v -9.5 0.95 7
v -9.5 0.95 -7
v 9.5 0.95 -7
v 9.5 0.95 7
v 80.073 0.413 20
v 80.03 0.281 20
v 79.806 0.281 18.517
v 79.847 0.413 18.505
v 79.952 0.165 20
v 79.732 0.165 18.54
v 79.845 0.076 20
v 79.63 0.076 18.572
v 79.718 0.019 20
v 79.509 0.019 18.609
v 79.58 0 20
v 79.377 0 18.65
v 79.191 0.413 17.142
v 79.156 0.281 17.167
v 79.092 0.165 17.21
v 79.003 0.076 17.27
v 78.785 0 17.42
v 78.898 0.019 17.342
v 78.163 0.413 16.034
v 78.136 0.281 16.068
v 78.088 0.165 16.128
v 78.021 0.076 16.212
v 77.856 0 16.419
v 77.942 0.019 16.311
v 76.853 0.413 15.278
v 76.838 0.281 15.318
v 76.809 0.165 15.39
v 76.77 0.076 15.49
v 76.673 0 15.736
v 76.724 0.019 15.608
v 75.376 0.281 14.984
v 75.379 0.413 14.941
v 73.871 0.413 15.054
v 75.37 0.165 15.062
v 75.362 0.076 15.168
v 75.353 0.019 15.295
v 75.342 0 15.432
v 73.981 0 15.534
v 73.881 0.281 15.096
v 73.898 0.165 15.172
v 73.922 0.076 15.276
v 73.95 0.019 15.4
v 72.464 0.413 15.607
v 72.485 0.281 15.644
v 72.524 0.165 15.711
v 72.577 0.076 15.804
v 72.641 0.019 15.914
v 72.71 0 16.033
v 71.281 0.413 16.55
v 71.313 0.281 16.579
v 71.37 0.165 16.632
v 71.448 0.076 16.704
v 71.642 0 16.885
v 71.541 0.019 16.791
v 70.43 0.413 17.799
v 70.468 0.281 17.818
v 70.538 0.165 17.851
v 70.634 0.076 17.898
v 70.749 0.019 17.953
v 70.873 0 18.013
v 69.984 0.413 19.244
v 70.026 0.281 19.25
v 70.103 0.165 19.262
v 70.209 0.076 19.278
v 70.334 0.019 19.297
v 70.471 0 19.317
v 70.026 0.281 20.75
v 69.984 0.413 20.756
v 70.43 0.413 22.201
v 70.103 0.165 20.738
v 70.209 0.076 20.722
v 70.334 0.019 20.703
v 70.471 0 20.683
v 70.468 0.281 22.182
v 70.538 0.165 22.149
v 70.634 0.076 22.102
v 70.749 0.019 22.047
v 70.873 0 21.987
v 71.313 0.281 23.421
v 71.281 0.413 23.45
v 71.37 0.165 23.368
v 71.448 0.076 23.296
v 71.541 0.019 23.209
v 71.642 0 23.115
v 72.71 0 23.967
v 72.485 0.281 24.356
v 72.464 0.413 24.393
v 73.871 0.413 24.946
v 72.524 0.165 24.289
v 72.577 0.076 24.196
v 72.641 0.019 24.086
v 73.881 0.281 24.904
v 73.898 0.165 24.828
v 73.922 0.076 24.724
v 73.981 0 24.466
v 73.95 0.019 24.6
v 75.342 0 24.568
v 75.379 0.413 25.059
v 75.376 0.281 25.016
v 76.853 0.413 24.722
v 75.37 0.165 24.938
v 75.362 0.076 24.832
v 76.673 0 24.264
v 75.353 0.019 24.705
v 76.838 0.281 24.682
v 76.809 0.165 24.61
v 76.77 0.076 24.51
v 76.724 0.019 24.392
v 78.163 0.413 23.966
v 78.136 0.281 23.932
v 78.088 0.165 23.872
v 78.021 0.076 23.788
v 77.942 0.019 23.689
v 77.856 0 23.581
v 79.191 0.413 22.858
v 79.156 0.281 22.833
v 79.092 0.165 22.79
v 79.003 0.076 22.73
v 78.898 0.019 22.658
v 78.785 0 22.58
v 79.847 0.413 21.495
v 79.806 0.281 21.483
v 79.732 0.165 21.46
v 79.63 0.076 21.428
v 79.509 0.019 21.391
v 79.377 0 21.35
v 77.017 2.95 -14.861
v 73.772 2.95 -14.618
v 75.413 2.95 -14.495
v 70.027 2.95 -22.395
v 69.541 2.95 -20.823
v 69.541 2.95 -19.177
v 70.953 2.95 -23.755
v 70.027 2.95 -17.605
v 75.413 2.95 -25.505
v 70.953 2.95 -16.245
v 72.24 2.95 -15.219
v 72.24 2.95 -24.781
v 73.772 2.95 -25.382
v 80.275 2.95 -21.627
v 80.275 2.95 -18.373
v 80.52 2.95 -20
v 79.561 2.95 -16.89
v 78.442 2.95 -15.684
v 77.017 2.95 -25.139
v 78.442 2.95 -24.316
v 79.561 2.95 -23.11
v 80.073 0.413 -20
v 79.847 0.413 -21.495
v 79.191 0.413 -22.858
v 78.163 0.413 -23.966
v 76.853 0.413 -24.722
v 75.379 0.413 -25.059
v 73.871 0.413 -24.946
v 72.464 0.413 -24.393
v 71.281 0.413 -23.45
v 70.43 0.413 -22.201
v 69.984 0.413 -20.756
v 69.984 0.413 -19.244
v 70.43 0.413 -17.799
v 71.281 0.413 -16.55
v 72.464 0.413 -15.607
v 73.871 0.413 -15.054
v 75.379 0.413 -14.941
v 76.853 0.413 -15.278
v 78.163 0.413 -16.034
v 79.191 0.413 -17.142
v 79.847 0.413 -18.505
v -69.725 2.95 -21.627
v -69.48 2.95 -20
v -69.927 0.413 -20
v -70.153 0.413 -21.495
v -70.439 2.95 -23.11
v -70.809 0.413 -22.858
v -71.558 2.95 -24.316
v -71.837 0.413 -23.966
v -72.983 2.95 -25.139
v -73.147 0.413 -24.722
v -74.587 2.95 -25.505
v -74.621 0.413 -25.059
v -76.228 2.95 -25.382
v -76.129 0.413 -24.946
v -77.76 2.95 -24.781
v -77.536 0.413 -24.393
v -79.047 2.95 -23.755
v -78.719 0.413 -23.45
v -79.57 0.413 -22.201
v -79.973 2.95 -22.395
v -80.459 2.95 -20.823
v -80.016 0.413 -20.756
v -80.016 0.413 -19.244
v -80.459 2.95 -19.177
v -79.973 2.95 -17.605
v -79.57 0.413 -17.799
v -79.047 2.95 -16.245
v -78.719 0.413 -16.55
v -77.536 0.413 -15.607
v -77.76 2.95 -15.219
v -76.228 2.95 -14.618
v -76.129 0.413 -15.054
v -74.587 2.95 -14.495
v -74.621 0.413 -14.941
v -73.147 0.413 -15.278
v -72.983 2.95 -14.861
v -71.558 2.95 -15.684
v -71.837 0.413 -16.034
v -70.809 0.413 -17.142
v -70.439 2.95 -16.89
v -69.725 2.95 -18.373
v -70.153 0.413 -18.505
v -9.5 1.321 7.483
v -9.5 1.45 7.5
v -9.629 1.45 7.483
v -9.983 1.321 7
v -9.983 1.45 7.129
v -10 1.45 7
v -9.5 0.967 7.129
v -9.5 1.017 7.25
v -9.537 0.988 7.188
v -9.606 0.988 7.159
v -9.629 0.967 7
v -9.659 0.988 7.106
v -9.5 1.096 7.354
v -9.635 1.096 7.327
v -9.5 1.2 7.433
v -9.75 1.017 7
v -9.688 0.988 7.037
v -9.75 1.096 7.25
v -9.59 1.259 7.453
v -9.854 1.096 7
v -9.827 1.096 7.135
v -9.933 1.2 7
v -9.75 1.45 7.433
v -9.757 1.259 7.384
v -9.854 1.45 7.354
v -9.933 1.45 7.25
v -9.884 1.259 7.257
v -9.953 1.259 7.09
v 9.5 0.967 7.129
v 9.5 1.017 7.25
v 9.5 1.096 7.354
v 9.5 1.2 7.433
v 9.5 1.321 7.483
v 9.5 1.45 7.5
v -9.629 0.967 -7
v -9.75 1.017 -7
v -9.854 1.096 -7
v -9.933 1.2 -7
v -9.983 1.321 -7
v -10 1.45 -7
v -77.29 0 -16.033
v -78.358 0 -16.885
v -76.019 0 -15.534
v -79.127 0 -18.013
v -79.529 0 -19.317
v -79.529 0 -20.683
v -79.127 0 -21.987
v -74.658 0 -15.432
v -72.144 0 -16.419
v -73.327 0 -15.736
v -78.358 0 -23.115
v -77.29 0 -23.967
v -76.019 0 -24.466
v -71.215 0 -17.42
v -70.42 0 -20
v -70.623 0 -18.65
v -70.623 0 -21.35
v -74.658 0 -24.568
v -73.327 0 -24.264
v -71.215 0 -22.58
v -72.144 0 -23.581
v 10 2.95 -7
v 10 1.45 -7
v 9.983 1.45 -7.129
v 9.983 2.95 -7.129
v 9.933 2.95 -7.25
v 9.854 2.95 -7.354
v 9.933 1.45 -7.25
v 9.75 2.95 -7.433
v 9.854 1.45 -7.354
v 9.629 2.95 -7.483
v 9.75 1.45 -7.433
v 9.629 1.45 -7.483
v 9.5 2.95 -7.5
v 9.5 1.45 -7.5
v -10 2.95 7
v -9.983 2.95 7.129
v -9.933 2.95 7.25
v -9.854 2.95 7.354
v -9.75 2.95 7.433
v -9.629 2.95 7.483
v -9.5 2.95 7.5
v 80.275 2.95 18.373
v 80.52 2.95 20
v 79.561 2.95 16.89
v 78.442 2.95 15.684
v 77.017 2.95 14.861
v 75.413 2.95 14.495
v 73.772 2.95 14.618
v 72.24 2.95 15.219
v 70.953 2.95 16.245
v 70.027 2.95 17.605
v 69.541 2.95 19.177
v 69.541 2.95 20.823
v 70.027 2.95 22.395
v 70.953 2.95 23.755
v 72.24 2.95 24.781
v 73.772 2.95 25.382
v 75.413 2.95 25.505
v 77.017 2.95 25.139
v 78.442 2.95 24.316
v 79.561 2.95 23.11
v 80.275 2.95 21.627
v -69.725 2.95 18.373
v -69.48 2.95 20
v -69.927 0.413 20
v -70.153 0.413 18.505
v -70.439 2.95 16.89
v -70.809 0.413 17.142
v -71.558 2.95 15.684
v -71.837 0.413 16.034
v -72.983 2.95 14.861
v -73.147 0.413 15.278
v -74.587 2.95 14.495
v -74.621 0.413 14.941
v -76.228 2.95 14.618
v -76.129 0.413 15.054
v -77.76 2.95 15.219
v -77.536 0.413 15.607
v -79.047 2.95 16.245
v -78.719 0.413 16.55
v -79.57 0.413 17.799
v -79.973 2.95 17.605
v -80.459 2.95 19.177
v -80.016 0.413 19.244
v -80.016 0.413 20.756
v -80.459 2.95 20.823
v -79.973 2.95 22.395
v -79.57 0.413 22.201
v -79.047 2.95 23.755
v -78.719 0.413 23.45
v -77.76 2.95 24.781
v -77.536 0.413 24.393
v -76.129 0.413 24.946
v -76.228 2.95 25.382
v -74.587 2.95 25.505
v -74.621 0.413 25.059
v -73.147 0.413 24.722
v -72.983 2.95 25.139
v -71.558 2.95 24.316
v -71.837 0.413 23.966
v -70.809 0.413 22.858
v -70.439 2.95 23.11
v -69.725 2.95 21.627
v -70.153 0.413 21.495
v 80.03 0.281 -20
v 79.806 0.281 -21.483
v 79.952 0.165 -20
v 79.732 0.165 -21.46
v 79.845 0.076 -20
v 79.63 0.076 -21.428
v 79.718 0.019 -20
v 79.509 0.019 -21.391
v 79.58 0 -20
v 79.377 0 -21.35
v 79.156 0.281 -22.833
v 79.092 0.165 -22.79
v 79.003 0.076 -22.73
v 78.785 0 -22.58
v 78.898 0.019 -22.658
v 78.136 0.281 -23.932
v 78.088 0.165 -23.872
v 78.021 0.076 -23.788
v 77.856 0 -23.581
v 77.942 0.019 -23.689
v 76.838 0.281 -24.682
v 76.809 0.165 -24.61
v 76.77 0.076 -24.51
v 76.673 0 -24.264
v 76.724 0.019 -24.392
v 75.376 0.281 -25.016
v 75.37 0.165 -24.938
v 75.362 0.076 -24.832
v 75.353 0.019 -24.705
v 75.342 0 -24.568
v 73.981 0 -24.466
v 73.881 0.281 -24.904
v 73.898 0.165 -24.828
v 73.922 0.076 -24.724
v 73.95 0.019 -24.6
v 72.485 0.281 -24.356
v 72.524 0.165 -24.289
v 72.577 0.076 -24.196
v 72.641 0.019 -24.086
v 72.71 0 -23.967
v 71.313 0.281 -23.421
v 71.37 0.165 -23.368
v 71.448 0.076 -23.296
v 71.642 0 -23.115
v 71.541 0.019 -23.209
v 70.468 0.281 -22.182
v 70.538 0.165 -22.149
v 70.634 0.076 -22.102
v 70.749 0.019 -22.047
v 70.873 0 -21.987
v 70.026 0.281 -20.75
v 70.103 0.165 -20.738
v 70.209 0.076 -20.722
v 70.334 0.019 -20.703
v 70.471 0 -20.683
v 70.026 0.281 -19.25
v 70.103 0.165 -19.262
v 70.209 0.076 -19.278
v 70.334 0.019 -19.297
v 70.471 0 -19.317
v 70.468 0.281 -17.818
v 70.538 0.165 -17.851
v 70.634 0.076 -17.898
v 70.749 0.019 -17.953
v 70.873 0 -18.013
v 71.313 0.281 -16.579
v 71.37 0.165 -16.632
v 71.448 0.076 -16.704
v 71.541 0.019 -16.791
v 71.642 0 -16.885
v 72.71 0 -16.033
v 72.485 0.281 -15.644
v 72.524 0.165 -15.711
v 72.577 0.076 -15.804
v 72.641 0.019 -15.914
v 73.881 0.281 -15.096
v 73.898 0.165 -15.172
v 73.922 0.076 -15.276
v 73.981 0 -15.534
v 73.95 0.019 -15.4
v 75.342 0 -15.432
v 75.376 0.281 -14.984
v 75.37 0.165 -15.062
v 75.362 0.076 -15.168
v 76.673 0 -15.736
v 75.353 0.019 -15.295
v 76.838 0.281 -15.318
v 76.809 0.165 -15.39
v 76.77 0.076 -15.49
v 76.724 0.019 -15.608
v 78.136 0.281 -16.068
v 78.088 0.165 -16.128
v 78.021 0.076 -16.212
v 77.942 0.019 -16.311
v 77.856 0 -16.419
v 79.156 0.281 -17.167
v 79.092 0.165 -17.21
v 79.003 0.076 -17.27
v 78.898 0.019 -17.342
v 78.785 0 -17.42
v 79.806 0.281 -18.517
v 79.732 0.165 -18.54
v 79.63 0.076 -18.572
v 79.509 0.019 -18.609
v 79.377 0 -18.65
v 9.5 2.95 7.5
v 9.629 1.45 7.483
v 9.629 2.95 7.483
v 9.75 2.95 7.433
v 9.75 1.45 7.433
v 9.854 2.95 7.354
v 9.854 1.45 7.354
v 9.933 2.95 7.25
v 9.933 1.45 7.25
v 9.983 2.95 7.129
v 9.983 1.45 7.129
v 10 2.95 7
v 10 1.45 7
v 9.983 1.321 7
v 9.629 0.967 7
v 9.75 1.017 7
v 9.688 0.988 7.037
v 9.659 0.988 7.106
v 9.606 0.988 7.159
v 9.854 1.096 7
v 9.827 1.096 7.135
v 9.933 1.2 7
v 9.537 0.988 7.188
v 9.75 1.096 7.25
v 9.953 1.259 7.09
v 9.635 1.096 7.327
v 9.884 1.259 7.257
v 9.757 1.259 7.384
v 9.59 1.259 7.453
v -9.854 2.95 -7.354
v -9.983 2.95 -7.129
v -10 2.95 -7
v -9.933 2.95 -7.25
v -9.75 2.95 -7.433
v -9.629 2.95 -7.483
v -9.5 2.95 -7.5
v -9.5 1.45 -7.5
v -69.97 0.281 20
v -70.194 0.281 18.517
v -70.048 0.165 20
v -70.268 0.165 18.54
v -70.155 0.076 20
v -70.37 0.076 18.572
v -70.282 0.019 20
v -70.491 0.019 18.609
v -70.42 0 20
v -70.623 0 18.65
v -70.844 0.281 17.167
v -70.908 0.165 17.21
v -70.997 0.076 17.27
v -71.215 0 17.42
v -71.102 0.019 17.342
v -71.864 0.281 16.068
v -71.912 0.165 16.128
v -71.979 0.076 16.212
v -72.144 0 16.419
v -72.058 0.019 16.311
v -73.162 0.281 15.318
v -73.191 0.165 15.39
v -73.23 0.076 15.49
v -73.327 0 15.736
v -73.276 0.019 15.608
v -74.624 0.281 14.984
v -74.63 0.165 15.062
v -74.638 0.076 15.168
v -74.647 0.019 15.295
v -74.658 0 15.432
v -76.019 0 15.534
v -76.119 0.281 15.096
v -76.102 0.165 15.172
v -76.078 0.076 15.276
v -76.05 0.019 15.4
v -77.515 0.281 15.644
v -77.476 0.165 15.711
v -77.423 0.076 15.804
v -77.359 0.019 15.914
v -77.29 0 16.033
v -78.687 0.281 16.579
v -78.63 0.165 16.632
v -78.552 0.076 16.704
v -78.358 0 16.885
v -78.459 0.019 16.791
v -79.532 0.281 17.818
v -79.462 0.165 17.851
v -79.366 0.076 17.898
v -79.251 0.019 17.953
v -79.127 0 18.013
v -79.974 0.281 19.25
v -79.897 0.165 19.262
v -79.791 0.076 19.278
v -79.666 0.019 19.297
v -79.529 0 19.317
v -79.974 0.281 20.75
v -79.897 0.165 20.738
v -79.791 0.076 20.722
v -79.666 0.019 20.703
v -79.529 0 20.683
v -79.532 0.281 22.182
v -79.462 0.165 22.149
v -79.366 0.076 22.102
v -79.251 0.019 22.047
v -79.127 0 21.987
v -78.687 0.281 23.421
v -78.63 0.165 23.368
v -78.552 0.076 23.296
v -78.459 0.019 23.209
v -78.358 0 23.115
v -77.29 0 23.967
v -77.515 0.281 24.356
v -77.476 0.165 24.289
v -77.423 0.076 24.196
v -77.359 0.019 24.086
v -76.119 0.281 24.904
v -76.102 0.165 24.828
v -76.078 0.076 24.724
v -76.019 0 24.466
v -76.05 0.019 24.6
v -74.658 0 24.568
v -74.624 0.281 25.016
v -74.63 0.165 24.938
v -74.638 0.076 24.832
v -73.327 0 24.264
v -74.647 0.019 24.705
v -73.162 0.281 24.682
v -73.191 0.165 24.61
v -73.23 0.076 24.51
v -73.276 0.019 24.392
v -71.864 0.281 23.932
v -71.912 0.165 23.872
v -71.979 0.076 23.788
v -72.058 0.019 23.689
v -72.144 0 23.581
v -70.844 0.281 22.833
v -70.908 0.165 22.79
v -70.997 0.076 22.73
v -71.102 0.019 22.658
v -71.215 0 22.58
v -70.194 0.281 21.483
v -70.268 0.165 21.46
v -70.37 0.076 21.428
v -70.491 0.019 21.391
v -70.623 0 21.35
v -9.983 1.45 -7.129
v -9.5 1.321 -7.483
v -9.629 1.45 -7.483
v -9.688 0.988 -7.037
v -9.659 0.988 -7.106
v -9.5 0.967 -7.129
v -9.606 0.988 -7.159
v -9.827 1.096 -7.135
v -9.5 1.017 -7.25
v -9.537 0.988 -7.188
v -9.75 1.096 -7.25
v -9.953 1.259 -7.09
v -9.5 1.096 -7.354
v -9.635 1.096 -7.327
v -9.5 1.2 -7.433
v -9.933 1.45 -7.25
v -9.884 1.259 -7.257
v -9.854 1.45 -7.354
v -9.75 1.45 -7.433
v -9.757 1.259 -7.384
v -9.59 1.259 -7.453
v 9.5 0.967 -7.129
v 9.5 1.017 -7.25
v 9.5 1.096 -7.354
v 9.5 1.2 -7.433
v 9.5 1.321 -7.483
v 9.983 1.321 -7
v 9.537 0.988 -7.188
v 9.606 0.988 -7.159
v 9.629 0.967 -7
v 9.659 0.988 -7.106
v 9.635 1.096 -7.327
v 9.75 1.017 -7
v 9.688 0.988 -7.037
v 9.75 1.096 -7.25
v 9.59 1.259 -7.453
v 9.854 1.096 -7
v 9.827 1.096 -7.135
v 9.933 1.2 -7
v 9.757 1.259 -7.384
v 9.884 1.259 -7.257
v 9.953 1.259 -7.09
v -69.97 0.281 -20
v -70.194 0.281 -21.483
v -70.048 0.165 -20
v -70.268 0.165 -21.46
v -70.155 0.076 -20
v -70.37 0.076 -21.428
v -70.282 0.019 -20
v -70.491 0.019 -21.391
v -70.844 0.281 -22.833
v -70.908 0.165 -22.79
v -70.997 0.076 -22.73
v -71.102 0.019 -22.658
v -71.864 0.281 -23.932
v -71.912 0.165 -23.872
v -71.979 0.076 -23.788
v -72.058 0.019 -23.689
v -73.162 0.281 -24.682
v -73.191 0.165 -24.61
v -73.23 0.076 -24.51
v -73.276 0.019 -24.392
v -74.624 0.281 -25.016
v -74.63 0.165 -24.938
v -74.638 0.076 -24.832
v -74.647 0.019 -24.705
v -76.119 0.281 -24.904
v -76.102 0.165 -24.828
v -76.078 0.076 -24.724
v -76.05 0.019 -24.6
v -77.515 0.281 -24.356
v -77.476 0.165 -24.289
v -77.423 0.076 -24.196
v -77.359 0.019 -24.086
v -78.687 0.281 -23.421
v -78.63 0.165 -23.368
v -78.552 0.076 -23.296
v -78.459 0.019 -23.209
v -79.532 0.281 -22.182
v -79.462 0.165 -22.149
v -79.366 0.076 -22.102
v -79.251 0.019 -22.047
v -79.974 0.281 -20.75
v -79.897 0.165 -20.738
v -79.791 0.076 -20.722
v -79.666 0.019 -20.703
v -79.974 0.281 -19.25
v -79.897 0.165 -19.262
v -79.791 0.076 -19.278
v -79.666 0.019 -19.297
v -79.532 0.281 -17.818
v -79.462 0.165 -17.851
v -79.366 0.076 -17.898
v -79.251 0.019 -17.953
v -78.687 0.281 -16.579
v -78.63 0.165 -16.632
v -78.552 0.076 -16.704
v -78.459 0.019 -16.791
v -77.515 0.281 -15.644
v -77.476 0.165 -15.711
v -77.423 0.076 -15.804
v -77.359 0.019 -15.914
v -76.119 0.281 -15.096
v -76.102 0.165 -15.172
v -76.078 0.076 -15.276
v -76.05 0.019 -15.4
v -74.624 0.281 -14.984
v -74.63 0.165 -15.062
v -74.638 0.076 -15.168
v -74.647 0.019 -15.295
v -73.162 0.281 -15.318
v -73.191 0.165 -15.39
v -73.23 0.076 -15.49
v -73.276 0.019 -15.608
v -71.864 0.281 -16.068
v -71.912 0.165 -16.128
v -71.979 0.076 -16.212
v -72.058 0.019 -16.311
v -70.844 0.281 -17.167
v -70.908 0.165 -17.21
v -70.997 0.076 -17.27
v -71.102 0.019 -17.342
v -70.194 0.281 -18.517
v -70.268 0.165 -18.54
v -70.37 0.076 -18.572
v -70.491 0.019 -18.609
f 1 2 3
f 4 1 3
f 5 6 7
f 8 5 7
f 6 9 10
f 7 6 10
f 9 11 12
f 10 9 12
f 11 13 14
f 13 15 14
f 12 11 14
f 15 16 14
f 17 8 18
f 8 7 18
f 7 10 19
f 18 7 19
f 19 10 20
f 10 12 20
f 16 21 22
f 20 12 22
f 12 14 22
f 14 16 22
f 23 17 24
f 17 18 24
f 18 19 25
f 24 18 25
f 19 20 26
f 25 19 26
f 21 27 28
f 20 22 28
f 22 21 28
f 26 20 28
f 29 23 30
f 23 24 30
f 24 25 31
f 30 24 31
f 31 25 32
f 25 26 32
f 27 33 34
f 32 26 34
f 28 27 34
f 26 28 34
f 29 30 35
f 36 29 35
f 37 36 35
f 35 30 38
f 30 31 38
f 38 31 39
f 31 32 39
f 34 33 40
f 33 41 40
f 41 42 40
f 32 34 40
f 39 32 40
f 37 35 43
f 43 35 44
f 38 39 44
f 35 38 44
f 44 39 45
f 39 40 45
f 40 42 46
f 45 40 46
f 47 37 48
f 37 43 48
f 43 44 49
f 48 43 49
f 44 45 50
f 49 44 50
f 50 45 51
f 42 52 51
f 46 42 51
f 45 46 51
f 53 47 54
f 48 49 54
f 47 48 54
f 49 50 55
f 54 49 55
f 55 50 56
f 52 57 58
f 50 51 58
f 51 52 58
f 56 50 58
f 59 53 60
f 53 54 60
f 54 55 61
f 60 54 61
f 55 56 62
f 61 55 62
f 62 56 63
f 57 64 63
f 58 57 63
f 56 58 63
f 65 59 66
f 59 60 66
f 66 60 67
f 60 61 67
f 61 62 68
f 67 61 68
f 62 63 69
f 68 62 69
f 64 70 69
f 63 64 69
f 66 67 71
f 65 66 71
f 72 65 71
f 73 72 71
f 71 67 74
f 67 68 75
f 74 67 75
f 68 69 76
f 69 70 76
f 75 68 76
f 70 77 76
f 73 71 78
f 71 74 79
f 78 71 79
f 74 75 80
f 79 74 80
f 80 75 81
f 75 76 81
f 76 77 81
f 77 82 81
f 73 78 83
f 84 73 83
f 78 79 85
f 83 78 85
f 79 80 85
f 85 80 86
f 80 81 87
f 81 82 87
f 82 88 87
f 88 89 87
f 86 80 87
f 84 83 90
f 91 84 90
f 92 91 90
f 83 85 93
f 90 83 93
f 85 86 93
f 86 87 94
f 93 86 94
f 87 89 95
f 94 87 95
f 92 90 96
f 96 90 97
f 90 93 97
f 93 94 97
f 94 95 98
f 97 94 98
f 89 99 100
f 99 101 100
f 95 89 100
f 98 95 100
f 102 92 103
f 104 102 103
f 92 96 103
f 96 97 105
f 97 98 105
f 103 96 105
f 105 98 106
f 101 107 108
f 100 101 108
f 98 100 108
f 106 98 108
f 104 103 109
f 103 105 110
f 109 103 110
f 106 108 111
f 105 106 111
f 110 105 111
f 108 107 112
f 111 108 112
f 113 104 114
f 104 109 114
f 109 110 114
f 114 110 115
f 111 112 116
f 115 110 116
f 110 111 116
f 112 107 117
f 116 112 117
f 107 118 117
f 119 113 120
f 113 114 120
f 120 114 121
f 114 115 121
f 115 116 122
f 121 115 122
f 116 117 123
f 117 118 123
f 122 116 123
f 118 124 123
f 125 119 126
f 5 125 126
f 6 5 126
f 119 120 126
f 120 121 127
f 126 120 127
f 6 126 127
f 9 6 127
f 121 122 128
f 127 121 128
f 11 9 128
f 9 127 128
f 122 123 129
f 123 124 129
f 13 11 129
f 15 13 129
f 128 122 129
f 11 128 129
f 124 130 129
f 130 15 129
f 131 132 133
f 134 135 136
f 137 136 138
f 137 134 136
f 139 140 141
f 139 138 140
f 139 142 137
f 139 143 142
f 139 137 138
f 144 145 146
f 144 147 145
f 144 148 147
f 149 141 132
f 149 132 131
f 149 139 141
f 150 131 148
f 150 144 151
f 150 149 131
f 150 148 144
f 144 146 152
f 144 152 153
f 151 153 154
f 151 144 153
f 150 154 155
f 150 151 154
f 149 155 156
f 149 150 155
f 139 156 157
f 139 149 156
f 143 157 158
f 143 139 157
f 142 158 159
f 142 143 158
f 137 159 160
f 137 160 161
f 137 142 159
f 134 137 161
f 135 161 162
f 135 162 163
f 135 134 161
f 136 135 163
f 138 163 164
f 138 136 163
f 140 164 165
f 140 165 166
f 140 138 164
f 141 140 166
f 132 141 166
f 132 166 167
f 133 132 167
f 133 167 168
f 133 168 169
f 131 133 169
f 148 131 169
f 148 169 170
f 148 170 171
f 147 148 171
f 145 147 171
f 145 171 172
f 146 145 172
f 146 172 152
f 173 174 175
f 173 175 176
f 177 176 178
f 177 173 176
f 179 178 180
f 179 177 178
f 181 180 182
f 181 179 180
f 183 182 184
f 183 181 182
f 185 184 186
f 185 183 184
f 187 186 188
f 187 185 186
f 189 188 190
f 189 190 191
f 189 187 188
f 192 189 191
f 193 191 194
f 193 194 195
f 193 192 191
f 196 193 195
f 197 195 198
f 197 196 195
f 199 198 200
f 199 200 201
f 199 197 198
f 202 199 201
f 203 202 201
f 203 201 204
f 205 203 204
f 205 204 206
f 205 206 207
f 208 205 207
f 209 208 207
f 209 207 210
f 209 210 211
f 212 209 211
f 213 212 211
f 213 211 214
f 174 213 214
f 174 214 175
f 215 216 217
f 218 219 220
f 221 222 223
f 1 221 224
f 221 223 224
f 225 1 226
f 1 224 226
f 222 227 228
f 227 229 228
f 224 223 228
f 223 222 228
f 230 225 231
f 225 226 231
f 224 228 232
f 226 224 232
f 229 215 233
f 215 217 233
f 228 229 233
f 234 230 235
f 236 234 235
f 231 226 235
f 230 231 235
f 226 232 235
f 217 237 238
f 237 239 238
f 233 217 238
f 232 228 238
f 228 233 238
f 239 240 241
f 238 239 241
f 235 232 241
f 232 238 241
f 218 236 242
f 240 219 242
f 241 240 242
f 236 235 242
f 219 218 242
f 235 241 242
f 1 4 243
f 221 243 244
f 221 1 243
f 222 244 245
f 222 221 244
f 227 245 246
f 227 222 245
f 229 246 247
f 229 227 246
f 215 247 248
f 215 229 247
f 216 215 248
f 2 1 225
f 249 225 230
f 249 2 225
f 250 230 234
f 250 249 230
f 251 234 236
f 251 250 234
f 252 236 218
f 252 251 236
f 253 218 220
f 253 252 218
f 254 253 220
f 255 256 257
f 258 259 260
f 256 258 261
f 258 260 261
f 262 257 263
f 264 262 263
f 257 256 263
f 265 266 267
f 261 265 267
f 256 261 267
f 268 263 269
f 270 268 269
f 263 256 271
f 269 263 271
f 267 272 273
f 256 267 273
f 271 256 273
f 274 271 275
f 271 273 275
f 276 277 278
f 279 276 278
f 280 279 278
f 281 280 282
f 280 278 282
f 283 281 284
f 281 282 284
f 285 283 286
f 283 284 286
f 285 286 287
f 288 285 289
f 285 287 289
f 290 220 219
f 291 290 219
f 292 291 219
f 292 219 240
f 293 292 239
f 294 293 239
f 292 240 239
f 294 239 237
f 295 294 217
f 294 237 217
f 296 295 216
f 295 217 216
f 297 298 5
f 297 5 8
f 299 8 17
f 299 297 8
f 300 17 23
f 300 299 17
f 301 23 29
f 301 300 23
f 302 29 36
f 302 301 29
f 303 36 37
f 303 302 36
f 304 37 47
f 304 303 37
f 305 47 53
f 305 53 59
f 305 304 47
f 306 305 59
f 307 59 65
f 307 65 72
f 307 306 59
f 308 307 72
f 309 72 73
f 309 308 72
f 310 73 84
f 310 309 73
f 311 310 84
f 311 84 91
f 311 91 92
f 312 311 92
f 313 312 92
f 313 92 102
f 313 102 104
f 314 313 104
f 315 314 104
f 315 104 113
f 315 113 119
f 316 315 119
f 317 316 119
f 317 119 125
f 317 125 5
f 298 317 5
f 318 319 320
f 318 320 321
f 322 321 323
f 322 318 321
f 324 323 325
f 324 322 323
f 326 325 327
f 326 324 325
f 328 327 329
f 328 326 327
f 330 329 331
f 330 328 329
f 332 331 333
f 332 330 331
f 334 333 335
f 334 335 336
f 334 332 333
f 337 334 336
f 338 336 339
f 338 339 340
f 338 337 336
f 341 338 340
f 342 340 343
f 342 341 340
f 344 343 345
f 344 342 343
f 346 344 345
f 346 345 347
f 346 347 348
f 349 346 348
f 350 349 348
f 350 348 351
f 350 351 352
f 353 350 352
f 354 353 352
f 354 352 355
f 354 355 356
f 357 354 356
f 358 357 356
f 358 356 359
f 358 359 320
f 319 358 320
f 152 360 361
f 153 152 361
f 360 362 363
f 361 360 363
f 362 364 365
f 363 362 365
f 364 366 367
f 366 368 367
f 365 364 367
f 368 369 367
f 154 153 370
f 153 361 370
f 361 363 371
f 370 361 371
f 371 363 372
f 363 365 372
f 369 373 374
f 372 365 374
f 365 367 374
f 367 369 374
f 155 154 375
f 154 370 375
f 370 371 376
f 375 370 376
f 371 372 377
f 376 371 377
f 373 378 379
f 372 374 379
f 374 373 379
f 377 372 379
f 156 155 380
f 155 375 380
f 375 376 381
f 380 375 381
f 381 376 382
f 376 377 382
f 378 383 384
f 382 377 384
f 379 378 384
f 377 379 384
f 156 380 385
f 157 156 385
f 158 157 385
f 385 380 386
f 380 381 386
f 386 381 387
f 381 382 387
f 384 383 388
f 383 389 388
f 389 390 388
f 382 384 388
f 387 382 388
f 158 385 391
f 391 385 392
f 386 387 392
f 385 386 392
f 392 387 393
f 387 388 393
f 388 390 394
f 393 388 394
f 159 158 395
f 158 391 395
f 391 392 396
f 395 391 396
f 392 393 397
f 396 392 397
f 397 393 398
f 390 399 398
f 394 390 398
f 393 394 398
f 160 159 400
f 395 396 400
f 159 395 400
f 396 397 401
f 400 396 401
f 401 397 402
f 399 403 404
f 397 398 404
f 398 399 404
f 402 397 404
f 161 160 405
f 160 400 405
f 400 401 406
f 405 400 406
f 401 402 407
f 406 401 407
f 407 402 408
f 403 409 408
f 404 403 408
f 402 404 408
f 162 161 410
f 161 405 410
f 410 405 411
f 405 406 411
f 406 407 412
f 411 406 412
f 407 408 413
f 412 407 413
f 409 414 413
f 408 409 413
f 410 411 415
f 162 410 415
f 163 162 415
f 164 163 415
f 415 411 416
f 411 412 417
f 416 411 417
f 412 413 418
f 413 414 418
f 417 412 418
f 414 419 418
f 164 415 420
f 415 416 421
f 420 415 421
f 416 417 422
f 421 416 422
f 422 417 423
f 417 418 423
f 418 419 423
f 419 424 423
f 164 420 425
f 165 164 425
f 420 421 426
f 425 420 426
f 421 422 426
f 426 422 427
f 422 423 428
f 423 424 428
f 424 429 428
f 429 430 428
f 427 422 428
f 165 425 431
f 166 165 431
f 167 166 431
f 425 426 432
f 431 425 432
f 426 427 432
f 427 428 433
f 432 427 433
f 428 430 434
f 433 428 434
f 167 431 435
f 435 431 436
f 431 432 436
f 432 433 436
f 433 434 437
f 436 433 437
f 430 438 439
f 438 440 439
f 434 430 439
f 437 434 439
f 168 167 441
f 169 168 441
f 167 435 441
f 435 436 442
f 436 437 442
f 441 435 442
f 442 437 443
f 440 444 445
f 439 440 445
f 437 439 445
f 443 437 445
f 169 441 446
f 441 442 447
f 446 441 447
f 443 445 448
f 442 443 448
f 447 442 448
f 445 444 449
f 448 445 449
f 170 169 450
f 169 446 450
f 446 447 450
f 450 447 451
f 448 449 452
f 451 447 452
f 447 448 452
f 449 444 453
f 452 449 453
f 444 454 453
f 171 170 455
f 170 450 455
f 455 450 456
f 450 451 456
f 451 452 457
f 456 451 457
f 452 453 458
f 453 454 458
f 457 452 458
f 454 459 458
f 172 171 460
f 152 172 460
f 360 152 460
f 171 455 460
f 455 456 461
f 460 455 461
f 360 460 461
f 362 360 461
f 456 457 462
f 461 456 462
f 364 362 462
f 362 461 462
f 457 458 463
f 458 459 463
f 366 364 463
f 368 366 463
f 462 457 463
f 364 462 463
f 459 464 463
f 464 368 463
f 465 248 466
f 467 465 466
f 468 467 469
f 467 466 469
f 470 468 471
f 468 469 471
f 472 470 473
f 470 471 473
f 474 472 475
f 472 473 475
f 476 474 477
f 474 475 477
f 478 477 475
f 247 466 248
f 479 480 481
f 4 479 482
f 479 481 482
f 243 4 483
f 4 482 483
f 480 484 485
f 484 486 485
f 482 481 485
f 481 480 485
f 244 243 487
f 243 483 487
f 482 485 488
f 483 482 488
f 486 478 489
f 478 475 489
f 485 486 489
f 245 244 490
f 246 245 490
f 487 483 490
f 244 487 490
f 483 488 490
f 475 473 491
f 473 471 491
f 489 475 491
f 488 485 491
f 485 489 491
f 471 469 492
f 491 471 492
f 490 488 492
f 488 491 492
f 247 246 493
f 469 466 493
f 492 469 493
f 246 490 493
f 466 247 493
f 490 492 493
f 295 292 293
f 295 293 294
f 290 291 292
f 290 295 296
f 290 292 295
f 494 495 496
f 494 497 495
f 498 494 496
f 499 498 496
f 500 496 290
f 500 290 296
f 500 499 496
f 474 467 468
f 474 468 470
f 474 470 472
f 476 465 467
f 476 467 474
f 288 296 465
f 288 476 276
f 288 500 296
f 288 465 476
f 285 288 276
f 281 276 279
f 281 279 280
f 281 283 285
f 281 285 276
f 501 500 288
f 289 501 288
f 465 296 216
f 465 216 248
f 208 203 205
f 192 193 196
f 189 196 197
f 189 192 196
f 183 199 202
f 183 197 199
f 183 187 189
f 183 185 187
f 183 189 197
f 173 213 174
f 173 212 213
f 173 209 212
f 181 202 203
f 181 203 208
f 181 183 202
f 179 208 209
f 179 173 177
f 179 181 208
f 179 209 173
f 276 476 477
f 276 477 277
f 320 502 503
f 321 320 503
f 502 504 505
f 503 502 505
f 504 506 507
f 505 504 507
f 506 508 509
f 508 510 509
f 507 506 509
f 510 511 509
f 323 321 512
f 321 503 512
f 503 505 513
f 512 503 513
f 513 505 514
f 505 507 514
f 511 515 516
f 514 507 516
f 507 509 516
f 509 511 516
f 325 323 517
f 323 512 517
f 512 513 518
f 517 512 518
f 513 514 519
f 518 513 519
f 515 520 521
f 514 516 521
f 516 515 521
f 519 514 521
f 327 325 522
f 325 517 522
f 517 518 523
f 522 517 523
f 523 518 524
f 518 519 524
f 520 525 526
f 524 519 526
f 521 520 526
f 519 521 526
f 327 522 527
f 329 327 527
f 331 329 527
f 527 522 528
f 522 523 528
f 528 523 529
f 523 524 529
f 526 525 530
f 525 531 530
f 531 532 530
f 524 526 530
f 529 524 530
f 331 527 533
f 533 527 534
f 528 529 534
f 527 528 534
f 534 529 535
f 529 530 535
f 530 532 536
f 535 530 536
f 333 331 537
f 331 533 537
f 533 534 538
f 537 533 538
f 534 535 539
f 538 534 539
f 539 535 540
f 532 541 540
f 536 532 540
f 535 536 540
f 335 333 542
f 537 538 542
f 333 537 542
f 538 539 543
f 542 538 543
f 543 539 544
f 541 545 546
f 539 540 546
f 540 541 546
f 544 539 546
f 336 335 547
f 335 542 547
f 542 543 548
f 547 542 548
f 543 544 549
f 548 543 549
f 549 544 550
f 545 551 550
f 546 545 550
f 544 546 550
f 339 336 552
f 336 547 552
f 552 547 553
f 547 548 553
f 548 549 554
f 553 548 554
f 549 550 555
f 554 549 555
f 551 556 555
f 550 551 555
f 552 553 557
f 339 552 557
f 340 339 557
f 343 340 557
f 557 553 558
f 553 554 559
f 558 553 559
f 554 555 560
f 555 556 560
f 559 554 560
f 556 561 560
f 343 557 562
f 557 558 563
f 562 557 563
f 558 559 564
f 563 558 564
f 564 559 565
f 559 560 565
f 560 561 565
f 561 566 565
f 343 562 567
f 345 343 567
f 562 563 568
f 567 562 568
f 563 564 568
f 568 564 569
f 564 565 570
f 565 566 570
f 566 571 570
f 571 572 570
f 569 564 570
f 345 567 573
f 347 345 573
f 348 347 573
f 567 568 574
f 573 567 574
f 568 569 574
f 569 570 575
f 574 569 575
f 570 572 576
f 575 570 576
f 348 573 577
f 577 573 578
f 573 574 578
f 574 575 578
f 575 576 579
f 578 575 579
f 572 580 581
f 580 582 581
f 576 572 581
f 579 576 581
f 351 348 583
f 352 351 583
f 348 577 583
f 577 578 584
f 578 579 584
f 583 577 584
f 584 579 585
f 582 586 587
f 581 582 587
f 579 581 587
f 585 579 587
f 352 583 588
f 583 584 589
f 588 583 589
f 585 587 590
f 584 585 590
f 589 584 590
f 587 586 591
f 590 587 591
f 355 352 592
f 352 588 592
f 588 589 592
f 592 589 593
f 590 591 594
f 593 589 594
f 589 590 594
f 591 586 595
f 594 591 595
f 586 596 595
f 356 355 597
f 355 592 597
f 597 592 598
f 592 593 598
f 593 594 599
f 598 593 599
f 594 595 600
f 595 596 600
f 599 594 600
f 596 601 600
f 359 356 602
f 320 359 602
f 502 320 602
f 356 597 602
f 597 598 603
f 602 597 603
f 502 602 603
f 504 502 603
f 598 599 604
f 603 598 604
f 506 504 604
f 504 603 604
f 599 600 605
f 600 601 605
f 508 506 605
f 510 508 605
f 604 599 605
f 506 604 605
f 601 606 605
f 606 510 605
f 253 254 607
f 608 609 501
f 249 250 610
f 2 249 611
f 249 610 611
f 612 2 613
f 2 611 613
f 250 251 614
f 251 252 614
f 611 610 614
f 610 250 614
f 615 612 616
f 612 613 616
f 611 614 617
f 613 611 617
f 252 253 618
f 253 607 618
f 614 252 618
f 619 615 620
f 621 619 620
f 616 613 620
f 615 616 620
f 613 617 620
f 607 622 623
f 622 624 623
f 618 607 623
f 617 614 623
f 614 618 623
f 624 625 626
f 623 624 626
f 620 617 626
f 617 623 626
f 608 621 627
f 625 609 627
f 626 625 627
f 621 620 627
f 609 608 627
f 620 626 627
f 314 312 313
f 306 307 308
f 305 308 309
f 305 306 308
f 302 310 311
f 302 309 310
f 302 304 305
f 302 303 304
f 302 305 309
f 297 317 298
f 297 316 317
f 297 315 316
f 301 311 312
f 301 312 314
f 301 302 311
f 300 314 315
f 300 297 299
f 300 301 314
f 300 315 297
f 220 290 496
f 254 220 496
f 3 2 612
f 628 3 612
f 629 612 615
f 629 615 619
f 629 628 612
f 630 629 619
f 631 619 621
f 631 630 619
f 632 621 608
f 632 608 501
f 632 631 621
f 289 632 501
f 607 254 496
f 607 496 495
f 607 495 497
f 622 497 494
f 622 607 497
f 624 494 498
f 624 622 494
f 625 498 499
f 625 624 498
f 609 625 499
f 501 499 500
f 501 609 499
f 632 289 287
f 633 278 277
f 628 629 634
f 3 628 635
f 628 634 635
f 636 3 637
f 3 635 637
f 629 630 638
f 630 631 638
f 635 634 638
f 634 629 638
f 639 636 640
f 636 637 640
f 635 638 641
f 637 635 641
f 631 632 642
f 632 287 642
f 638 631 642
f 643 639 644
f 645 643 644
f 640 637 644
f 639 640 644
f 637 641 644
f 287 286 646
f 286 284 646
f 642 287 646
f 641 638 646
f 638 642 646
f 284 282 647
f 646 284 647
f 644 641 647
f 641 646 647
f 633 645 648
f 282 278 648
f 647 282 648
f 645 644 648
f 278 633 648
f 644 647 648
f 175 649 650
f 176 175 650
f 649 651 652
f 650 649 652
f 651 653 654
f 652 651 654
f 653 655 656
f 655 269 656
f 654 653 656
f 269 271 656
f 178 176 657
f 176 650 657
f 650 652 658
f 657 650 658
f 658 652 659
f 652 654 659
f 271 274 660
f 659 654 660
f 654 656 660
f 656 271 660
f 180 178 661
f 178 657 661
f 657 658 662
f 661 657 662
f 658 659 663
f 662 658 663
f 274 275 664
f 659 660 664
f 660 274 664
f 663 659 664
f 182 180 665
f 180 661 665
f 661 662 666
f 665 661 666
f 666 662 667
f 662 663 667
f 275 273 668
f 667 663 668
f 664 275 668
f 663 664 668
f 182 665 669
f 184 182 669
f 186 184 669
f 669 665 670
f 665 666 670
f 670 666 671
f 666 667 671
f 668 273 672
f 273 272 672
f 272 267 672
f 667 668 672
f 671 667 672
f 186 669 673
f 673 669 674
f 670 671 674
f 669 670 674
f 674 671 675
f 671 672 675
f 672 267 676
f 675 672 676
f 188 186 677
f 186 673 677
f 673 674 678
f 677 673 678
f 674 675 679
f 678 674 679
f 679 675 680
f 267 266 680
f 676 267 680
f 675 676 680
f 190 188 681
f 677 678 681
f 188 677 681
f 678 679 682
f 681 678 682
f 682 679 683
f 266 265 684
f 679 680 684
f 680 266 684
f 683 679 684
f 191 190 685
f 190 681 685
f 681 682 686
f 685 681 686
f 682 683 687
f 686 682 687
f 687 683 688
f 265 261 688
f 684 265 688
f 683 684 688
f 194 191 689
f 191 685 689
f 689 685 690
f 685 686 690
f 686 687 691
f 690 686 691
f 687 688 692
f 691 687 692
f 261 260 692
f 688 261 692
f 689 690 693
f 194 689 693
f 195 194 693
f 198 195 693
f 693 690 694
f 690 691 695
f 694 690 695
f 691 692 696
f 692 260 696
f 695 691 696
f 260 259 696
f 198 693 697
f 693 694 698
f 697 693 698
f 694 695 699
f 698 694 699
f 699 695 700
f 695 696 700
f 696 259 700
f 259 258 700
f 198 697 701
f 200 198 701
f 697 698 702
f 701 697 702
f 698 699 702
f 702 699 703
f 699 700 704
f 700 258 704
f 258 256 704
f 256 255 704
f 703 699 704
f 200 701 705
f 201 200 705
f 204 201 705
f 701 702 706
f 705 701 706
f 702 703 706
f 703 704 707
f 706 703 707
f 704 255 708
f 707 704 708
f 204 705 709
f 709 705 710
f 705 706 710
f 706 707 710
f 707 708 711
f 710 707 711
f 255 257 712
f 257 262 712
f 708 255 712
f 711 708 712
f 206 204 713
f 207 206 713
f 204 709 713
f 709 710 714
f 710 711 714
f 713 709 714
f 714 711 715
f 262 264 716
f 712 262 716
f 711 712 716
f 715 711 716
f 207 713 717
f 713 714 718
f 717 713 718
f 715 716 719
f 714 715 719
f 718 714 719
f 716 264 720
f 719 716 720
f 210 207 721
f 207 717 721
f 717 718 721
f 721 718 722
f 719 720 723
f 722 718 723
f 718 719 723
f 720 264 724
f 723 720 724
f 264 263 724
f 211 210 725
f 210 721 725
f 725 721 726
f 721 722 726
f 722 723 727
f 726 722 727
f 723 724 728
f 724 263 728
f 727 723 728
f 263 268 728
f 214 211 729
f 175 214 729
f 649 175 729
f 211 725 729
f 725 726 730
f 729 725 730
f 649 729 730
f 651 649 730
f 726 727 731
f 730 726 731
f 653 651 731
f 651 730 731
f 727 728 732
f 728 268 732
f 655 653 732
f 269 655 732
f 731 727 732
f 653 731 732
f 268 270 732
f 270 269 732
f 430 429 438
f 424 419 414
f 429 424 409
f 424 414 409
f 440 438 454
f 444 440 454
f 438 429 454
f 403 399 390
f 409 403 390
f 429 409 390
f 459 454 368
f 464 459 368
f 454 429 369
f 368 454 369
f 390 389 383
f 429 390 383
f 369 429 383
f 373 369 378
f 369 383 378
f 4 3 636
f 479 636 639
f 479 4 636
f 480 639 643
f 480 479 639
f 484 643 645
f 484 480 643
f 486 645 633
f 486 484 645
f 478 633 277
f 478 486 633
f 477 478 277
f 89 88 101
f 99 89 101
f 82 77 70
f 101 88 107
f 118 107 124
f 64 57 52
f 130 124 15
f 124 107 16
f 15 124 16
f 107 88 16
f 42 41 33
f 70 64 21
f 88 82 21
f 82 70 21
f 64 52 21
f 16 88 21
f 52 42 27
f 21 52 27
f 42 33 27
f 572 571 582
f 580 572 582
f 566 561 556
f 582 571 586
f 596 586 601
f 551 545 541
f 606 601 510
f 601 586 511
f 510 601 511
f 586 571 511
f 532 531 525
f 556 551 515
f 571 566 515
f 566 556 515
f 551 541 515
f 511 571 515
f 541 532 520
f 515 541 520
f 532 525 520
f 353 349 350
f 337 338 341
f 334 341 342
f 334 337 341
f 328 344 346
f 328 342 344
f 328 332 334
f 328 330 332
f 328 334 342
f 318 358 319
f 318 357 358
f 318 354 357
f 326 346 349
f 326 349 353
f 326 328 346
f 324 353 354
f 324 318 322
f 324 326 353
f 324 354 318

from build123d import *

# Parameters (mm, degrees)
SKETCH1_R             = 5
BOSS_EXTRUDE1_DEPTH   = 2.95
BOSS_EXTRUDE1_TAPER   = -10
BOSS_EXTRUDE1_2_DEPTH = 2.95
BOSS_EXTRUDE1_2_TAPER = -10
BOSS_EXTRUDE1_3_DEPTH = 2.95
BOSS_EXTRUDE1_3_TAPER = -10
BOSS_EXTRUDE1_4_DEPTH = 2.95
BOSS_EXTRUDE1_4_TAPER = -10
FILLET1_R             = 0.5
FILLET2_R             = 0.5
FILLET3_R             = 0.5
FILLET4_R             = 0.5
SKETCH2_W             = 20
SKETCH2_H             = 15
BOSS_EXTRUDE2_DEPTH   = 2
FILLET5_R             = 0.5
FILLET6_R             = 0.5


with BuildPart() as part:
    # Sketch1 → Boss-Extrude1 (new body)
    with BuildSketch(Plane(origin=(0, 0, 0), x_dir=(1, 0, 0), z_dir=(0, 1, 0))):
        with Locations((-75, 20)):
            Circle(SKETCH1_R)
    extrude(amount=BOSS_EXTRUDE1_DEPTH, taper=BOSS_EXTRUDE1_TAPER)

    # Fillet1
    fillet1_edges = [part.edges().sort_by_distance(p)[0] for p in [
        (-80, 0, -20),
    ]]
    fillet(fillet1_edges, radius=FILLET1_R)


with BuildPart() as body_2:
    # Sketch1 → Boss-Extrude1 2 (new body)
    with BuildSketch(Plane(origin=(0, 0, 0), x_dir=(1, 0, 0), z_dir=(0, 1, 0))):
        with Locations((-75, -20)):
            Circle(SKETCH1_R)
    extrude(amount=BOSS_EXTRUDE1_2_DEPTH, taper=BOSS_EXTRUDE1_2_TAPER)

    # Fillet2
    fillet2_edges = [body_2.edges().sort_by_distance(p)[0] for p in [
        (-80, 0, 20),
    ]]
    fillet(fillet2_edges, radius=FILLET2_R)


with BuildPart() as body_3:
    # Sketch1 → Boss-Extrude1 3 (new body)
    with BuildSketch(Plane(origin=(0, 0, 0), x_dir=(1, 0, 0), z_dir=(0, 1, 0))):
        with Locations((75, 20)):
            Circle(SKETCH1_R)
    extrude(amount=BOSS_EXTRUDE1_3_DEPTH, taper=BOSS_EXTRUDE1_3_TAPER)

    # Fillet3
    fillet3_edges = [body_3.edges().sort_by_distance(p)[0] for p in [
        (70, 0, -20),
    ]]
    fillet(fillet3_edges, radius=FILLET3_R)


with BuildPart() as body_4:
    # Sketch1 → Boss-Extrude1 4 (new body)
    with BuildSketch(Plane(origin=(0, 0, 0), x_dir=(1, 0, 0), z_dir=(0, 1, 0))):
        with Locations((75, -20)):
            Circle(SKETCH1_R)
    extrude(amount=BOSS_EXTRUDE1_4_DEPTH, taper=BOSS_EXTRUDE1_4_TAPER)

    # Fillet4
    fillet4_edges = [body_4.edges().sort_by_distance(p)[0] for p in [
        (70, 0, 20),
    ]]
    fillet(fillet4_edges, radius=FILLET4_R)


with BuildPart() as body_5:
    # Sketch2 → Boss-Extrude2 (new body)
    with BuildSketch(Plane(origin=(0, 2.95, 0), x_dir=(1, 0, 0), z_dir=(0, 1, 0))):
        Rectangle(SKETCH2_W, SKETCH2_H)
    extrude(amount=-BOSS_EXTRUDE2_DEPTH)

    # Fillet5
    fillet5_edges = [body_5.edges().sort_by_distance(p)[0] for p in [
        (10, 1.95, 7.5),
        (-10, 1.95, 7.5),
        (-10, 1.95, -7.5),
        (10, 1.95, -7.5),
    ]]
    fillet(fillet5_edges, radius=FILLET5_R)

    # Fillet6
    fillet6_edges = [body_5.edges().sort_by_distance(p)[0] for p in [
        (0, 0.95, -7.5),
        (-10, 0.95, 0),
        (10, 0.95, 0),
        (0, 0.95, 7.5),
        (9.853553391, 0.95, -7.353553391),
        (9.853553391, 0.95, 7.353553391),
        (-9.853553391, 0.95, 7.353553391),
        (-9.853553391, 0.95, -7.353553391),
    ]]
    fillet(fillet6_edges, radius=FILLET6_R)


solid = Compound([part.part, body_2.part, body_3.part, body_4.part, body_5.part])
